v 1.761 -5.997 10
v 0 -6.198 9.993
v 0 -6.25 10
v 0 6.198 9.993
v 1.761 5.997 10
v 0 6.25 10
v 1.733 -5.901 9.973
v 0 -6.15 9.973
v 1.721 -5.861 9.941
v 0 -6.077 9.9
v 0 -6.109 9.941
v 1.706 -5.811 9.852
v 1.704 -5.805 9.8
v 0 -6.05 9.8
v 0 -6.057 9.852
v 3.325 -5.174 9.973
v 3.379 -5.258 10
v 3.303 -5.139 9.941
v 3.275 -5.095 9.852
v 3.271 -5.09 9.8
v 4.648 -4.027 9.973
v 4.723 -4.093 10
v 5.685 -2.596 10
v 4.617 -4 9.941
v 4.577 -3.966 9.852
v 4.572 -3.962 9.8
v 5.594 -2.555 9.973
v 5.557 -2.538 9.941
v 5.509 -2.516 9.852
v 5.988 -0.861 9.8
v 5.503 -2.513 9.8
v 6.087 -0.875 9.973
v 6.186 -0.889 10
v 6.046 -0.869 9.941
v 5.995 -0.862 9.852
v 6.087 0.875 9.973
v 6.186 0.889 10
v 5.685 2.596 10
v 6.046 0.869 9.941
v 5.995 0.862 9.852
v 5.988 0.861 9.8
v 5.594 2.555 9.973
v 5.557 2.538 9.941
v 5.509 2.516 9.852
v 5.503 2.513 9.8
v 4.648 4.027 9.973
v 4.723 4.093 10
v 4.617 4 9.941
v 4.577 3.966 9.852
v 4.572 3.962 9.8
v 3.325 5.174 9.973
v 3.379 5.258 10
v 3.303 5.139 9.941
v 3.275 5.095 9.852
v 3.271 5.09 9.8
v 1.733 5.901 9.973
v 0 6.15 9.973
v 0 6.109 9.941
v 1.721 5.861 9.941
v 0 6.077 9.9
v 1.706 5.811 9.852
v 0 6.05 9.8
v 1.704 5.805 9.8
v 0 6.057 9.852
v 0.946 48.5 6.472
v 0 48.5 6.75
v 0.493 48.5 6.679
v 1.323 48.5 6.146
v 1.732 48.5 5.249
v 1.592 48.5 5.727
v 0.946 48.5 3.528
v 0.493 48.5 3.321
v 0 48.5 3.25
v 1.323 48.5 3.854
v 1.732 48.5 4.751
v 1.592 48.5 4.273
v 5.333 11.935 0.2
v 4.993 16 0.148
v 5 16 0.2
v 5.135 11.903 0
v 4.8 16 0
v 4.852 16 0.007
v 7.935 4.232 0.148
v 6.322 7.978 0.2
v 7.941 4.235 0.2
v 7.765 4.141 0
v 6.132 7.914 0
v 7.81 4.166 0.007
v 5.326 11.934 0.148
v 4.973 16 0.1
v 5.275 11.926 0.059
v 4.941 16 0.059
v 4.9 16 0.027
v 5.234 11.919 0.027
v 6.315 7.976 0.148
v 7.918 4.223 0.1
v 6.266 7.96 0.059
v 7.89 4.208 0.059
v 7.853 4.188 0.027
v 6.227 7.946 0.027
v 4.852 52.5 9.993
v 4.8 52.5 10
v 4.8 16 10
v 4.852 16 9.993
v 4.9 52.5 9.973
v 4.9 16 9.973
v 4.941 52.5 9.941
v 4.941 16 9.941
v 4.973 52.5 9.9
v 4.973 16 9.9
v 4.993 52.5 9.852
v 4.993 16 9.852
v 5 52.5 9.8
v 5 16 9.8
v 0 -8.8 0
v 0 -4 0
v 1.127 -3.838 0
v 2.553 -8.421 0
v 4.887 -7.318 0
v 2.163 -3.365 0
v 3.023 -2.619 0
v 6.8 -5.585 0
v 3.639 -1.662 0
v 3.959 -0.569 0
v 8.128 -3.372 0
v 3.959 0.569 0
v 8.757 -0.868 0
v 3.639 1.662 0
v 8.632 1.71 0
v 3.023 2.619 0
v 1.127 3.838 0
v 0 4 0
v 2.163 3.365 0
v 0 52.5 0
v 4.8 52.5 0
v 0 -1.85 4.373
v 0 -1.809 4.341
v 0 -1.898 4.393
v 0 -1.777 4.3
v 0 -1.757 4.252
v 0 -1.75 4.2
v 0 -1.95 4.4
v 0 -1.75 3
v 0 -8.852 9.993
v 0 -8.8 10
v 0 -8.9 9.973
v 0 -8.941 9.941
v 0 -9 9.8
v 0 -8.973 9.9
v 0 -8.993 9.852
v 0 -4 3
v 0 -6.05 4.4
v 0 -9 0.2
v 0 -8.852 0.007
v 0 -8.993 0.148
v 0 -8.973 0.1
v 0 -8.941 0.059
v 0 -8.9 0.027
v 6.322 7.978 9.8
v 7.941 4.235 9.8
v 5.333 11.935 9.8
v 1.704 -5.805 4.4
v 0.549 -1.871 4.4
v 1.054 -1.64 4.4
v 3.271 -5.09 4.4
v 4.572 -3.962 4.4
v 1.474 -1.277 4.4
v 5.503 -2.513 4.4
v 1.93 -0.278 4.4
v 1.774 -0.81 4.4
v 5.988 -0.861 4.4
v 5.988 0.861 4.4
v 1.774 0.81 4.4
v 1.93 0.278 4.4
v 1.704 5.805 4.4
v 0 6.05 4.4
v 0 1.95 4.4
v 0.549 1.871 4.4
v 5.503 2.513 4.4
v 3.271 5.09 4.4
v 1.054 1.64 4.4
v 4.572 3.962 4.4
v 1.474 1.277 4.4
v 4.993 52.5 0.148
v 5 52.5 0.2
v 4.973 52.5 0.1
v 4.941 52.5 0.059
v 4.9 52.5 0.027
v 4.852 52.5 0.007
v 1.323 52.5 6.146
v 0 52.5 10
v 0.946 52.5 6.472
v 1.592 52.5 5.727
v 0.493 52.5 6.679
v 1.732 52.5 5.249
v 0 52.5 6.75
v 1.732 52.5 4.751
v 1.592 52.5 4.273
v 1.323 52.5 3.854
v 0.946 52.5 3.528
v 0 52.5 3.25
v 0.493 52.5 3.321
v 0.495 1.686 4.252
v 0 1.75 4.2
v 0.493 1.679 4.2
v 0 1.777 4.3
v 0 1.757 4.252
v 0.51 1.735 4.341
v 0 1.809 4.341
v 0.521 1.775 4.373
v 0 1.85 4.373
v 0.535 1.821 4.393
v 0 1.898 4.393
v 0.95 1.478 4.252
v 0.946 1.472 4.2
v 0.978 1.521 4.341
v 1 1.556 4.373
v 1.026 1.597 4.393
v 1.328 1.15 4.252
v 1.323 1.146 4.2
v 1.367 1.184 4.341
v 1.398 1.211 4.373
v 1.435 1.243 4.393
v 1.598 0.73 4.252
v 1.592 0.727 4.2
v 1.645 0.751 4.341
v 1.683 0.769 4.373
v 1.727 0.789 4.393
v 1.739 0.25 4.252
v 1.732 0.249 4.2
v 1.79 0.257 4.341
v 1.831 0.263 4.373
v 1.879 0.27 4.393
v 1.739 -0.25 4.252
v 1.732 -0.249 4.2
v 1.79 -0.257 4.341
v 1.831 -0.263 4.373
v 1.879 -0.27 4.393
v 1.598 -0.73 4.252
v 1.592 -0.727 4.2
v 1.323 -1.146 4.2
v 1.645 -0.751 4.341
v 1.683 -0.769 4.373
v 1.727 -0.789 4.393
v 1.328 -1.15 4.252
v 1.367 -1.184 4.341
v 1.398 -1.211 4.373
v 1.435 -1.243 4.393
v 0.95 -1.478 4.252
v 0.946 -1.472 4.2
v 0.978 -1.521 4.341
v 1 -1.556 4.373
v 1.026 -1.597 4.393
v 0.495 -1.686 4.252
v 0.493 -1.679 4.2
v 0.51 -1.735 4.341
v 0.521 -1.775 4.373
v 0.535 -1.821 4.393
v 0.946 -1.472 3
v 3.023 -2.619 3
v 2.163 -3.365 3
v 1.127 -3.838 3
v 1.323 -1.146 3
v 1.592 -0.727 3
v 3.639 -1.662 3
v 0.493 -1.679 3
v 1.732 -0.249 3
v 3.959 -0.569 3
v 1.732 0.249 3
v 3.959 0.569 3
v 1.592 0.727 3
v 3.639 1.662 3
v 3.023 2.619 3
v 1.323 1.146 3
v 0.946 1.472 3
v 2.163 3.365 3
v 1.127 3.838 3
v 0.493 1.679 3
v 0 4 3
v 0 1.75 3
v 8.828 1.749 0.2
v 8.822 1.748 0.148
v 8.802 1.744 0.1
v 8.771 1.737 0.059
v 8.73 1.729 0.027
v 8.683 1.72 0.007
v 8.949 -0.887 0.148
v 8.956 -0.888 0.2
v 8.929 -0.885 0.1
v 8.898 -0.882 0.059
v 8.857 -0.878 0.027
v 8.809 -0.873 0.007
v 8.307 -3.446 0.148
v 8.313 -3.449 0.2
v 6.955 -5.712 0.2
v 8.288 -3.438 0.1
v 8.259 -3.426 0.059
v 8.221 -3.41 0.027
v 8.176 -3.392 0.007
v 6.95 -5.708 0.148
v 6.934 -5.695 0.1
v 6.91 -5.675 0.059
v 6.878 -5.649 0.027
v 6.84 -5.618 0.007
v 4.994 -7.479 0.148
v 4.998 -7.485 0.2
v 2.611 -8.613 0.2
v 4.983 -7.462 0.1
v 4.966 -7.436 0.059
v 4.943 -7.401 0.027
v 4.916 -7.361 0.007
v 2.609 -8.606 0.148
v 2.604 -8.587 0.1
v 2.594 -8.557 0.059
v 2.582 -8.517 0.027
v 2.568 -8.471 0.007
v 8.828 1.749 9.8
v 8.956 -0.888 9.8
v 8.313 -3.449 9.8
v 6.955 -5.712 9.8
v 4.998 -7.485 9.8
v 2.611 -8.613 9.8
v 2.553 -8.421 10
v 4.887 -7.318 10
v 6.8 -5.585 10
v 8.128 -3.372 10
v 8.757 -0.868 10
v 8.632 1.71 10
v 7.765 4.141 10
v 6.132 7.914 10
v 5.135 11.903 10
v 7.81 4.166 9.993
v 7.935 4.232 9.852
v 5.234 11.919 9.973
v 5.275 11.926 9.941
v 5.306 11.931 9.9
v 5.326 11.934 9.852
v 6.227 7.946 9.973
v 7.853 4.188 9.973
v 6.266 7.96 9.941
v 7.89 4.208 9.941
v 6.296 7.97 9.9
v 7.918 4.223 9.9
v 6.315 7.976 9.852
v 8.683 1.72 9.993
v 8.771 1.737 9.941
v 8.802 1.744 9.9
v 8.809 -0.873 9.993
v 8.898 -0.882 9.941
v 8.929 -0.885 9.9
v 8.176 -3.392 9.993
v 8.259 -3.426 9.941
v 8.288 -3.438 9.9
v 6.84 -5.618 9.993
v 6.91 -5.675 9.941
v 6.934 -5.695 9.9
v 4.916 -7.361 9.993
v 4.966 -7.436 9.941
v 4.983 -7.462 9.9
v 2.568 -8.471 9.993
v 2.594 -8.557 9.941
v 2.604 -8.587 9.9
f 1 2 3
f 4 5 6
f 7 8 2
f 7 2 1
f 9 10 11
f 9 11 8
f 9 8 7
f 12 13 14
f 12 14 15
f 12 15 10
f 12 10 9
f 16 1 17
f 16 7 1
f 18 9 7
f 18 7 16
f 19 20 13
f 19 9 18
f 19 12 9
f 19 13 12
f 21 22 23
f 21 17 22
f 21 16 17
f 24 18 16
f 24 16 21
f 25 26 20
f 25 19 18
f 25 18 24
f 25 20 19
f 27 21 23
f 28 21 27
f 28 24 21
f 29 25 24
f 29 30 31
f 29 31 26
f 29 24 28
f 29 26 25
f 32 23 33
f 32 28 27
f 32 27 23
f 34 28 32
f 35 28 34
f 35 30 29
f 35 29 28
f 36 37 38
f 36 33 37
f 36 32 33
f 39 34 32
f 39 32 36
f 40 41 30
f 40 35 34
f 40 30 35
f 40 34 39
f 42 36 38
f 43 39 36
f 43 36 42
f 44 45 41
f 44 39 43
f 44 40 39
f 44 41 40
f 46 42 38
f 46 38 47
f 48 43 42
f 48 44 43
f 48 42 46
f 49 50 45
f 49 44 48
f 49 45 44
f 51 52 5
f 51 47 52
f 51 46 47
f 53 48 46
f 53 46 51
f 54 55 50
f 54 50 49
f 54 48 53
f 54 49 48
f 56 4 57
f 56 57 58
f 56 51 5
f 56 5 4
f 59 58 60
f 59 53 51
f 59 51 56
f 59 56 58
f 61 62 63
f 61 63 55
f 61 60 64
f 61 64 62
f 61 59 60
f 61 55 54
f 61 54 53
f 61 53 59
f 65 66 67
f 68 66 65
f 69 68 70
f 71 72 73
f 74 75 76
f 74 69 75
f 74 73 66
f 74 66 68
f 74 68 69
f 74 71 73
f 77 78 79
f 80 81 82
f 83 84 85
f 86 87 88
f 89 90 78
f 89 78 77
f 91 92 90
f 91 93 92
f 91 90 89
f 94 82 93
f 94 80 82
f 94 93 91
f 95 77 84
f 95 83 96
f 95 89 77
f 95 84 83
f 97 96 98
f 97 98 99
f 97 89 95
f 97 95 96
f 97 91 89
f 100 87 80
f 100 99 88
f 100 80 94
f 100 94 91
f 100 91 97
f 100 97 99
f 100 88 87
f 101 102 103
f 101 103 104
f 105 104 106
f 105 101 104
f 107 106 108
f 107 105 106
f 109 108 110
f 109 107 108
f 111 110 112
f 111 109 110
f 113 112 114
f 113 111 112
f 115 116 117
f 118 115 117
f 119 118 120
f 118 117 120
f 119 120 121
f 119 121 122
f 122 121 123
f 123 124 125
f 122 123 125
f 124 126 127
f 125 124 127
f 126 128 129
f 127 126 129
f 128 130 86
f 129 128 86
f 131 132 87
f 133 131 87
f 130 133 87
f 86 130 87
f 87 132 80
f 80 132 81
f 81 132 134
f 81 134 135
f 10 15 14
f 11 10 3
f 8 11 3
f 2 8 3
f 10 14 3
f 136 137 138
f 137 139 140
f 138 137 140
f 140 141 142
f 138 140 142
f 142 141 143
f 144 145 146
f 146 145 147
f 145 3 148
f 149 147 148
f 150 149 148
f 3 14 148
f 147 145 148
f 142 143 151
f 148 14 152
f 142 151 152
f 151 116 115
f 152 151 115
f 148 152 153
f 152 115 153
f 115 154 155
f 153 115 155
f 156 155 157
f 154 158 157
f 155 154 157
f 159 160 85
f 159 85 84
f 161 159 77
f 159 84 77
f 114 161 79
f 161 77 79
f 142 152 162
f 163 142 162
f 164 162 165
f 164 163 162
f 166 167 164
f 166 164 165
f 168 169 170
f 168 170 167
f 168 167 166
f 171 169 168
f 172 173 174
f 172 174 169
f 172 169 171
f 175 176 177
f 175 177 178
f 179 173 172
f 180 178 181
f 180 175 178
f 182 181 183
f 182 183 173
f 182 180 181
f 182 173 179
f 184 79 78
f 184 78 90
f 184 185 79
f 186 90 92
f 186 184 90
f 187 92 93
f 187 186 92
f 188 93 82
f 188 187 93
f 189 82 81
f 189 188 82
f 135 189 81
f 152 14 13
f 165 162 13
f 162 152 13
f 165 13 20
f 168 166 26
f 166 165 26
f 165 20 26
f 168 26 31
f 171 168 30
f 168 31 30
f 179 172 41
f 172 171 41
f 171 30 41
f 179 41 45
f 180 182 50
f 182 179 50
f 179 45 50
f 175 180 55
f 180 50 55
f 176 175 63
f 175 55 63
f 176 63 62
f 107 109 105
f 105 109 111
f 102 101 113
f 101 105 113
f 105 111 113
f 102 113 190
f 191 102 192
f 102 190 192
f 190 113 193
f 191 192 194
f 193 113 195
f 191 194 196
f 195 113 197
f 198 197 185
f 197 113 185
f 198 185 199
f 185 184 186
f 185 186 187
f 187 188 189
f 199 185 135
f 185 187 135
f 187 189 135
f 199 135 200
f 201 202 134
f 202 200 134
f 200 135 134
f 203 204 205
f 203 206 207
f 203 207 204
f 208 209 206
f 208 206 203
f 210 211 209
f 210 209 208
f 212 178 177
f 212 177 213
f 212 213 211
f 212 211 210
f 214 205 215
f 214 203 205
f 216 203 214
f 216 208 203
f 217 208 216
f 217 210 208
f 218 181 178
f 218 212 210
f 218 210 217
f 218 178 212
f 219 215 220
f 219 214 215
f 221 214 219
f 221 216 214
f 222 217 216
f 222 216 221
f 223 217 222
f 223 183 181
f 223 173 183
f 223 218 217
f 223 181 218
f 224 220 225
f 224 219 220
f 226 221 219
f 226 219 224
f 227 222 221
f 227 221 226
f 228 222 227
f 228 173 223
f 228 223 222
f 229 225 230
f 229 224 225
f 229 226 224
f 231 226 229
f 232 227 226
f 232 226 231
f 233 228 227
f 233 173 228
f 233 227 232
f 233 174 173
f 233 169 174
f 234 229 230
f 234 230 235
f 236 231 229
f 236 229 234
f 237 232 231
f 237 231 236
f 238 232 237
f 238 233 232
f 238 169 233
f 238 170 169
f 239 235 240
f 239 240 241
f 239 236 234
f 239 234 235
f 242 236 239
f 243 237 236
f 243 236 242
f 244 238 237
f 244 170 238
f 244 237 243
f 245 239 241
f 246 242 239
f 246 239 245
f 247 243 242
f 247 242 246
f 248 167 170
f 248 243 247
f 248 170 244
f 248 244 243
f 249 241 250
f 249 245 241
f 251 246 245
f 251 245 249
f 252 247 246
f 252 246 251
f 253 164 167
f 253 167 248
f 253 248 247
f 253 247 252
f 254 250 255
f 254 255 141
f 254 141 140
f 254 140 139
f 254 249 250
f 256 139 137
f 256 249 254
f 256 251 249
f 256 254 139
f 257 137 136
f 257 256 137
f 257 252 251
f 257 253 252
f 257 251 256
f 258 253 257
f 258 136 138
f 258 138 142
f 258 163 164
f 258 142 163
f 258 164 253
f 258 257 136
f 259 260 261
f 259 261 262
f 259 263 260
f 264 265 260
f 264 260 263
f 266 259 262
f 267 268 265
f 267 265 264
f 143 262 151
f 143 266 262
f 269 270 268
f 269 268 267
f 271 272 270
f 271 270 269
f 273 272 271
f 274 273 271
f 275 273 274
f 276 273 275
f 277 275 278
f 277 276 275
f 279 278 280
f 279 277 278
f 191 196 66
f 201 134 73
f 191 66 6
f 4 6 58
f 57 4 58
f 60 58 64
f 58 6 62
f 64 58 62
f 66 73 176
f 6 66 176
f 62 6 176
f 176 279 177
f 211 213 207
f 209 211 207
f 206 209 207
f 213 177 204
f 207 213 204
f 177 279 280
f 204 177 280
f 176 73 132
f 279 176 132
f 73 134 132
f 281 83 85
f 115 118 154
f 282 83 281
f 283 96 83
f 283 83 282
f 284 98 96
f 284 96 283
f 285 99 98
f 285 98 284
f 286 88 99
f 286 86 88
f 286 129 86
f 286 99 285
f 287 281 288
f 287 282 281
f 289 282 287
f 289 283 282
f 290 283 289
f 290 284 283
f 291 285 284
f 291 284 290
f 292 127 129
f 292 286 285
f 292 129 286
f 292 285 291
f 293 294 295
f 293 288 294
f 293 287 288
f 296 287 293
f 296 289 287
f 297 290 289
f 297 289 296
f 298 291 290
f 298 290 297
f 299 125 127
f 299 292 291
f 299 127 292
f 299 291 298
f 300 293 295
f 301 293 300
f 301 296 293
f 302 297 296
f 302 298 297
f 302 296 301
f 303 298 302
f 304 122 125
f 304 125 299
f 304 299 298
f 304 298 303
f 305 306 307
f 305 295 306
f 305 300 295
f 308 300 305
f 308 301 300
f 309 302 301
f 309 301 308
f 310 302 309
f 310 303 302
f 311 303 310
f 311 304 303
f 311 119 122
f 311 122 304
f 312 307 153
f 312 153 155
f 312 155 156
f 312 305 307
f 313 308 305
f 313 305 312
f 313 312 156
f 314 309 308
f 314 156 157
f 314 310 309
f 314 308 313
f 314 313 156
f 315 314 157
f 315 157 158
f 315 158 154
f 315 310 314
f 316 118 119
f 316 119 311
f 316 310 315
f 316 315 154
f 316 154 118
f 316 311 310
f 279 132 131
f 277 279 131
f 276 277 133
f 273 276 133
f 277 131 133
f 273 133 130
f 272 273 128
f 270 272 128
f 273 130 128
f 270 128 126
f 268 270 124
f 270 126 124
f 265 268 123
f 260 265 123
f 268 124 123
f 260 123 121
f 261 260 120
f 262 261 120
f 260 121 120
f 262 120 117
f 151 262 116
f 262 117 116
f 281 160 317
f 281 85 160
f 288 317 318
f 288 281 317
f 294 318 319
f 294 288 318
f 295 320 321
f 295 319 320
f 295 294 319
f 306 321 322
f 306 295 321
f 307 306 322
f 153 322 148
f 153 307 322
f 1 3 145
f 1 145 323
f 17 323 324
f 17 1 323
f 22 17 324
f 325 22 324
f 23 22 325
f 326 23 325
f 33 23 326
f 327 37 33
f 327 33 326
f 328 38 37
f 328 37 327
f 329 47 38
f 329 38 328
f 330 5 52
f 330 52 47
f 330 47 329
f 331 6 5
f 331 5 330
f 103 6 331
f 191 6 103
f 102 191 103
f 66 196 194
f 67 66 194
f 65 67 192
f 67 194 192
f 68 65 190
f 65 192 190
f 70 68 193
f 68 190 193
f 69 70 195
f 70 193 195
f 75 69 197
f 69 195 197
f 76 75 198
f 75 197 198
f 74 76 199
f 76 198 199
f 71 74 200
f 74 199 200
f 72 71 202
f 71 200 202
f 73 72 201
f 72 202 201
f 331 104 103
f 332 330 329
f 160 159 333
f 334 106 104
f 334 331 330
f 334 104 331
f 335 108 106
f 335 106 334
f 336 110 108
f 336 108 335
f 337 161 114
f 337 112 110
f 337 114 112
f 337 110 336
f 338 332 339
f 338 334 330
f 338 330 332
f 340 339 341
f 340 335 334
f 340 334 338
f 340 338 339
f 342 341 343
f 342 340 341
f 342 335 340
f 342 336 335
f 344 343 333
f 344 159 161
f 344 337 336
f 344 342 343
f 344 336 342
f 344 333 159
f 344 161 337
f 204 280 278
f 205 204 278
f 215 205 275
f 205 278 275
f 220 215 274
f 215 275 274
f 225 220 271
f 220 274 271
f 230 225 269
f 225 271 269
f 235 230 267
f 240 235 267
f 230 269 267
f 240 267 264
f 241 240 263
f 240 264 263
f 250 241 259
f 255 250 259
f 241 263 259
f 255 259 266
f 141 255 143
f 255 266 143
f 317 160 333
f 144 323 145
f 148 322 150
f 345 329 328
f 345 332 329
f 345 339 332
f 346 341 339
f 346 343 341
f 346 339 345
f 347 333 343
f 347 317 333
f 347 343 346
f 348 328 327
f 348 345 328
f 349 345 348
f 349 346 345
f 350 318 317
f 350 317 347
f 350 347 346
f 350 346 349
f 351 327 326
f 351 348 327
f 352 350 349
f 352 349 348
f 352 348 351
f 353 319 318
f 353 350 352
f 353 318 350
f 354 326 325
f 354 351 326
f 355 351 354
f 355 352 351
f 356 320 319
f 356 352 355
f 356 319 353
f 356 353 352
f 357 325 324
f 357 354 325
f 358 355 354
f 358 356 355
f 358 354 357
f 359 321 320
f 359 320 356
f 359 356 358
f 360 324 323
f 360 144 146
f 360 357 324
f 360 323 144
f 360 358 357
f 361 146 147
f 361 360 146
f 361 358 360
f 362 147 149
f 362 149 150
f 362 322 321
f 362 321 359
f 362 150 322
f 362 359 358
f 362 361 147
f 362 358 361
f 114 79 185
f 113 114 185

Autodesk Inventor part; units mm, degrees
ref_plane "YZ Plane" through (0, 0, 0) normal (1, 0, 0) x (0, 1, 0)
ref_plane "XZ Plane" through (0, 0, 0) normal (0, 1, 0) x (-1, 0, 0)
ref_plane "XY Plane" through (0, 0, 0) normal (0, 0, 1) x (1, 0, 0)
sketch "Skizze1" plane through (0, 0, 0) normal (0, 0, 1) x (1, 0, 0)
  line L0 (5, 52.5) -> (-5, 52.5)
  line L1 (-5, 52.5) -> (-5, 16)
  line L2 (5, 16) -> (5, 52.5)
  arc A0 (-7.9412, 4.2353) -> (7.9412, 4.2353) centre (0, 0) ccw
  arc A1 (5, 16) -> (7.9412, 4.2353) centre (30, 16) ccw
  arc A2 (-7.9412, 4.2353) -> (-5, 16) centre (-30, 16) ccw
  line L3 (0, -25.0931) -> (0, 22.9698)
  line L4 (0, 68.0186) -> (0, -40.6118) projected
  point P0 (0, 0)
  point P1 (0, 0)
  point P2 (-5, 7.4833)
  point P3 (5, 7.4833)
  dimension "d1" = 18
  dimension "d4" = 25
  dimension "d7" = 0
  dimension "d8" = 52.5
  dimension "d9" = 0
  dimension "d10" = 0
  dimension "d20" = 5
  dimension "d21" = 5
extrude "Extrusion1" add sketch "Skizze1" along normal blind 10
sketch "Skizze4" plane through (0, 0, 10) normal (0, 0, 1) x (1, 0, 0)
  circle A0 centre (0, 0) radius 6.05
  dimension "d22" = 12.1
extrude "Extrusion2" cut sketch "Skizze4" against normal blind 5.6
fillet "Rundung1" radius 0.2 1 edges at (-6.05, 0, 10)
fillet "Rundung2" radius 0.2 10 edges at (5, 34.25, 10) (0, -9, 10) (-5.7464, 9.9366, 10) (-5, 34.25, 10) (5.7464, 9.9366, 10) (5, 34.25, 0) (0, -9, 0) (-5.7464, 9.9366, 0) (-5, 34.25, 0) (5.7464, 9.9366, 0)
sketch "Skizze5" plane through (0, 0, 0) normal (0, 0, -1) x (-1, 0, 0)
  circle A0 centre (0, 0) radius 1.75
  dimension "d27" = 3.5
extrude "Extrusion3" cut sketch "Skizze5" against normal up to next
fillet "Rundung3" radius 0.2 2 edges at (1.75, 0, 0) (1.75, 0, 4.4)
sketch "Skizze6" plane through (-4.8, 52.5, 0) normal (0, 1, 0) x (1, 0, 0)
  circle A0 centre (4.8, -5) radius 1.75
  line L0 (9.6, -10) -> (0, -10) projected
  line L1 (9.8, -0.2) -> (9.8, -9.8) projected
  point P0 (4.8, 0)
  dimension "d31" = 3.5
  dimension "d32" = 5
  dimension "d33" = 5
extrude "Extrusion4" cut sketch "Skizze6" against normal blind 4
sketch "Skizze7" plane through (0, 0, 0) normal (0, 0, -1) x (-1, 0, 0)
  circle A0 centre (0, 0) radius 4
  dimension "d36" = 8
extrude "Extrusion5" cut sketch "Skizze7" against normal blind 3
sketch "Skizze8" plane through (0, 0, 0) normal (0, 0, -1) x (-1, 0, 0)
  line L0 (0, -13.3377) -> (18.2323, -13.3377)
  line L1 (18.2323, -13.3377) -> (18.2323, 56.3283)
  line L2 (18.2323, 56.3283) -> (0, 56.3283)
  line L3 (0, 56.3283) -> (0, -13.3377)
  point P0 (0, 0)
extrude "Extrusion6" cut sketch "Skizze8" against normal up to next
properties part number "alternativeJoint2"
